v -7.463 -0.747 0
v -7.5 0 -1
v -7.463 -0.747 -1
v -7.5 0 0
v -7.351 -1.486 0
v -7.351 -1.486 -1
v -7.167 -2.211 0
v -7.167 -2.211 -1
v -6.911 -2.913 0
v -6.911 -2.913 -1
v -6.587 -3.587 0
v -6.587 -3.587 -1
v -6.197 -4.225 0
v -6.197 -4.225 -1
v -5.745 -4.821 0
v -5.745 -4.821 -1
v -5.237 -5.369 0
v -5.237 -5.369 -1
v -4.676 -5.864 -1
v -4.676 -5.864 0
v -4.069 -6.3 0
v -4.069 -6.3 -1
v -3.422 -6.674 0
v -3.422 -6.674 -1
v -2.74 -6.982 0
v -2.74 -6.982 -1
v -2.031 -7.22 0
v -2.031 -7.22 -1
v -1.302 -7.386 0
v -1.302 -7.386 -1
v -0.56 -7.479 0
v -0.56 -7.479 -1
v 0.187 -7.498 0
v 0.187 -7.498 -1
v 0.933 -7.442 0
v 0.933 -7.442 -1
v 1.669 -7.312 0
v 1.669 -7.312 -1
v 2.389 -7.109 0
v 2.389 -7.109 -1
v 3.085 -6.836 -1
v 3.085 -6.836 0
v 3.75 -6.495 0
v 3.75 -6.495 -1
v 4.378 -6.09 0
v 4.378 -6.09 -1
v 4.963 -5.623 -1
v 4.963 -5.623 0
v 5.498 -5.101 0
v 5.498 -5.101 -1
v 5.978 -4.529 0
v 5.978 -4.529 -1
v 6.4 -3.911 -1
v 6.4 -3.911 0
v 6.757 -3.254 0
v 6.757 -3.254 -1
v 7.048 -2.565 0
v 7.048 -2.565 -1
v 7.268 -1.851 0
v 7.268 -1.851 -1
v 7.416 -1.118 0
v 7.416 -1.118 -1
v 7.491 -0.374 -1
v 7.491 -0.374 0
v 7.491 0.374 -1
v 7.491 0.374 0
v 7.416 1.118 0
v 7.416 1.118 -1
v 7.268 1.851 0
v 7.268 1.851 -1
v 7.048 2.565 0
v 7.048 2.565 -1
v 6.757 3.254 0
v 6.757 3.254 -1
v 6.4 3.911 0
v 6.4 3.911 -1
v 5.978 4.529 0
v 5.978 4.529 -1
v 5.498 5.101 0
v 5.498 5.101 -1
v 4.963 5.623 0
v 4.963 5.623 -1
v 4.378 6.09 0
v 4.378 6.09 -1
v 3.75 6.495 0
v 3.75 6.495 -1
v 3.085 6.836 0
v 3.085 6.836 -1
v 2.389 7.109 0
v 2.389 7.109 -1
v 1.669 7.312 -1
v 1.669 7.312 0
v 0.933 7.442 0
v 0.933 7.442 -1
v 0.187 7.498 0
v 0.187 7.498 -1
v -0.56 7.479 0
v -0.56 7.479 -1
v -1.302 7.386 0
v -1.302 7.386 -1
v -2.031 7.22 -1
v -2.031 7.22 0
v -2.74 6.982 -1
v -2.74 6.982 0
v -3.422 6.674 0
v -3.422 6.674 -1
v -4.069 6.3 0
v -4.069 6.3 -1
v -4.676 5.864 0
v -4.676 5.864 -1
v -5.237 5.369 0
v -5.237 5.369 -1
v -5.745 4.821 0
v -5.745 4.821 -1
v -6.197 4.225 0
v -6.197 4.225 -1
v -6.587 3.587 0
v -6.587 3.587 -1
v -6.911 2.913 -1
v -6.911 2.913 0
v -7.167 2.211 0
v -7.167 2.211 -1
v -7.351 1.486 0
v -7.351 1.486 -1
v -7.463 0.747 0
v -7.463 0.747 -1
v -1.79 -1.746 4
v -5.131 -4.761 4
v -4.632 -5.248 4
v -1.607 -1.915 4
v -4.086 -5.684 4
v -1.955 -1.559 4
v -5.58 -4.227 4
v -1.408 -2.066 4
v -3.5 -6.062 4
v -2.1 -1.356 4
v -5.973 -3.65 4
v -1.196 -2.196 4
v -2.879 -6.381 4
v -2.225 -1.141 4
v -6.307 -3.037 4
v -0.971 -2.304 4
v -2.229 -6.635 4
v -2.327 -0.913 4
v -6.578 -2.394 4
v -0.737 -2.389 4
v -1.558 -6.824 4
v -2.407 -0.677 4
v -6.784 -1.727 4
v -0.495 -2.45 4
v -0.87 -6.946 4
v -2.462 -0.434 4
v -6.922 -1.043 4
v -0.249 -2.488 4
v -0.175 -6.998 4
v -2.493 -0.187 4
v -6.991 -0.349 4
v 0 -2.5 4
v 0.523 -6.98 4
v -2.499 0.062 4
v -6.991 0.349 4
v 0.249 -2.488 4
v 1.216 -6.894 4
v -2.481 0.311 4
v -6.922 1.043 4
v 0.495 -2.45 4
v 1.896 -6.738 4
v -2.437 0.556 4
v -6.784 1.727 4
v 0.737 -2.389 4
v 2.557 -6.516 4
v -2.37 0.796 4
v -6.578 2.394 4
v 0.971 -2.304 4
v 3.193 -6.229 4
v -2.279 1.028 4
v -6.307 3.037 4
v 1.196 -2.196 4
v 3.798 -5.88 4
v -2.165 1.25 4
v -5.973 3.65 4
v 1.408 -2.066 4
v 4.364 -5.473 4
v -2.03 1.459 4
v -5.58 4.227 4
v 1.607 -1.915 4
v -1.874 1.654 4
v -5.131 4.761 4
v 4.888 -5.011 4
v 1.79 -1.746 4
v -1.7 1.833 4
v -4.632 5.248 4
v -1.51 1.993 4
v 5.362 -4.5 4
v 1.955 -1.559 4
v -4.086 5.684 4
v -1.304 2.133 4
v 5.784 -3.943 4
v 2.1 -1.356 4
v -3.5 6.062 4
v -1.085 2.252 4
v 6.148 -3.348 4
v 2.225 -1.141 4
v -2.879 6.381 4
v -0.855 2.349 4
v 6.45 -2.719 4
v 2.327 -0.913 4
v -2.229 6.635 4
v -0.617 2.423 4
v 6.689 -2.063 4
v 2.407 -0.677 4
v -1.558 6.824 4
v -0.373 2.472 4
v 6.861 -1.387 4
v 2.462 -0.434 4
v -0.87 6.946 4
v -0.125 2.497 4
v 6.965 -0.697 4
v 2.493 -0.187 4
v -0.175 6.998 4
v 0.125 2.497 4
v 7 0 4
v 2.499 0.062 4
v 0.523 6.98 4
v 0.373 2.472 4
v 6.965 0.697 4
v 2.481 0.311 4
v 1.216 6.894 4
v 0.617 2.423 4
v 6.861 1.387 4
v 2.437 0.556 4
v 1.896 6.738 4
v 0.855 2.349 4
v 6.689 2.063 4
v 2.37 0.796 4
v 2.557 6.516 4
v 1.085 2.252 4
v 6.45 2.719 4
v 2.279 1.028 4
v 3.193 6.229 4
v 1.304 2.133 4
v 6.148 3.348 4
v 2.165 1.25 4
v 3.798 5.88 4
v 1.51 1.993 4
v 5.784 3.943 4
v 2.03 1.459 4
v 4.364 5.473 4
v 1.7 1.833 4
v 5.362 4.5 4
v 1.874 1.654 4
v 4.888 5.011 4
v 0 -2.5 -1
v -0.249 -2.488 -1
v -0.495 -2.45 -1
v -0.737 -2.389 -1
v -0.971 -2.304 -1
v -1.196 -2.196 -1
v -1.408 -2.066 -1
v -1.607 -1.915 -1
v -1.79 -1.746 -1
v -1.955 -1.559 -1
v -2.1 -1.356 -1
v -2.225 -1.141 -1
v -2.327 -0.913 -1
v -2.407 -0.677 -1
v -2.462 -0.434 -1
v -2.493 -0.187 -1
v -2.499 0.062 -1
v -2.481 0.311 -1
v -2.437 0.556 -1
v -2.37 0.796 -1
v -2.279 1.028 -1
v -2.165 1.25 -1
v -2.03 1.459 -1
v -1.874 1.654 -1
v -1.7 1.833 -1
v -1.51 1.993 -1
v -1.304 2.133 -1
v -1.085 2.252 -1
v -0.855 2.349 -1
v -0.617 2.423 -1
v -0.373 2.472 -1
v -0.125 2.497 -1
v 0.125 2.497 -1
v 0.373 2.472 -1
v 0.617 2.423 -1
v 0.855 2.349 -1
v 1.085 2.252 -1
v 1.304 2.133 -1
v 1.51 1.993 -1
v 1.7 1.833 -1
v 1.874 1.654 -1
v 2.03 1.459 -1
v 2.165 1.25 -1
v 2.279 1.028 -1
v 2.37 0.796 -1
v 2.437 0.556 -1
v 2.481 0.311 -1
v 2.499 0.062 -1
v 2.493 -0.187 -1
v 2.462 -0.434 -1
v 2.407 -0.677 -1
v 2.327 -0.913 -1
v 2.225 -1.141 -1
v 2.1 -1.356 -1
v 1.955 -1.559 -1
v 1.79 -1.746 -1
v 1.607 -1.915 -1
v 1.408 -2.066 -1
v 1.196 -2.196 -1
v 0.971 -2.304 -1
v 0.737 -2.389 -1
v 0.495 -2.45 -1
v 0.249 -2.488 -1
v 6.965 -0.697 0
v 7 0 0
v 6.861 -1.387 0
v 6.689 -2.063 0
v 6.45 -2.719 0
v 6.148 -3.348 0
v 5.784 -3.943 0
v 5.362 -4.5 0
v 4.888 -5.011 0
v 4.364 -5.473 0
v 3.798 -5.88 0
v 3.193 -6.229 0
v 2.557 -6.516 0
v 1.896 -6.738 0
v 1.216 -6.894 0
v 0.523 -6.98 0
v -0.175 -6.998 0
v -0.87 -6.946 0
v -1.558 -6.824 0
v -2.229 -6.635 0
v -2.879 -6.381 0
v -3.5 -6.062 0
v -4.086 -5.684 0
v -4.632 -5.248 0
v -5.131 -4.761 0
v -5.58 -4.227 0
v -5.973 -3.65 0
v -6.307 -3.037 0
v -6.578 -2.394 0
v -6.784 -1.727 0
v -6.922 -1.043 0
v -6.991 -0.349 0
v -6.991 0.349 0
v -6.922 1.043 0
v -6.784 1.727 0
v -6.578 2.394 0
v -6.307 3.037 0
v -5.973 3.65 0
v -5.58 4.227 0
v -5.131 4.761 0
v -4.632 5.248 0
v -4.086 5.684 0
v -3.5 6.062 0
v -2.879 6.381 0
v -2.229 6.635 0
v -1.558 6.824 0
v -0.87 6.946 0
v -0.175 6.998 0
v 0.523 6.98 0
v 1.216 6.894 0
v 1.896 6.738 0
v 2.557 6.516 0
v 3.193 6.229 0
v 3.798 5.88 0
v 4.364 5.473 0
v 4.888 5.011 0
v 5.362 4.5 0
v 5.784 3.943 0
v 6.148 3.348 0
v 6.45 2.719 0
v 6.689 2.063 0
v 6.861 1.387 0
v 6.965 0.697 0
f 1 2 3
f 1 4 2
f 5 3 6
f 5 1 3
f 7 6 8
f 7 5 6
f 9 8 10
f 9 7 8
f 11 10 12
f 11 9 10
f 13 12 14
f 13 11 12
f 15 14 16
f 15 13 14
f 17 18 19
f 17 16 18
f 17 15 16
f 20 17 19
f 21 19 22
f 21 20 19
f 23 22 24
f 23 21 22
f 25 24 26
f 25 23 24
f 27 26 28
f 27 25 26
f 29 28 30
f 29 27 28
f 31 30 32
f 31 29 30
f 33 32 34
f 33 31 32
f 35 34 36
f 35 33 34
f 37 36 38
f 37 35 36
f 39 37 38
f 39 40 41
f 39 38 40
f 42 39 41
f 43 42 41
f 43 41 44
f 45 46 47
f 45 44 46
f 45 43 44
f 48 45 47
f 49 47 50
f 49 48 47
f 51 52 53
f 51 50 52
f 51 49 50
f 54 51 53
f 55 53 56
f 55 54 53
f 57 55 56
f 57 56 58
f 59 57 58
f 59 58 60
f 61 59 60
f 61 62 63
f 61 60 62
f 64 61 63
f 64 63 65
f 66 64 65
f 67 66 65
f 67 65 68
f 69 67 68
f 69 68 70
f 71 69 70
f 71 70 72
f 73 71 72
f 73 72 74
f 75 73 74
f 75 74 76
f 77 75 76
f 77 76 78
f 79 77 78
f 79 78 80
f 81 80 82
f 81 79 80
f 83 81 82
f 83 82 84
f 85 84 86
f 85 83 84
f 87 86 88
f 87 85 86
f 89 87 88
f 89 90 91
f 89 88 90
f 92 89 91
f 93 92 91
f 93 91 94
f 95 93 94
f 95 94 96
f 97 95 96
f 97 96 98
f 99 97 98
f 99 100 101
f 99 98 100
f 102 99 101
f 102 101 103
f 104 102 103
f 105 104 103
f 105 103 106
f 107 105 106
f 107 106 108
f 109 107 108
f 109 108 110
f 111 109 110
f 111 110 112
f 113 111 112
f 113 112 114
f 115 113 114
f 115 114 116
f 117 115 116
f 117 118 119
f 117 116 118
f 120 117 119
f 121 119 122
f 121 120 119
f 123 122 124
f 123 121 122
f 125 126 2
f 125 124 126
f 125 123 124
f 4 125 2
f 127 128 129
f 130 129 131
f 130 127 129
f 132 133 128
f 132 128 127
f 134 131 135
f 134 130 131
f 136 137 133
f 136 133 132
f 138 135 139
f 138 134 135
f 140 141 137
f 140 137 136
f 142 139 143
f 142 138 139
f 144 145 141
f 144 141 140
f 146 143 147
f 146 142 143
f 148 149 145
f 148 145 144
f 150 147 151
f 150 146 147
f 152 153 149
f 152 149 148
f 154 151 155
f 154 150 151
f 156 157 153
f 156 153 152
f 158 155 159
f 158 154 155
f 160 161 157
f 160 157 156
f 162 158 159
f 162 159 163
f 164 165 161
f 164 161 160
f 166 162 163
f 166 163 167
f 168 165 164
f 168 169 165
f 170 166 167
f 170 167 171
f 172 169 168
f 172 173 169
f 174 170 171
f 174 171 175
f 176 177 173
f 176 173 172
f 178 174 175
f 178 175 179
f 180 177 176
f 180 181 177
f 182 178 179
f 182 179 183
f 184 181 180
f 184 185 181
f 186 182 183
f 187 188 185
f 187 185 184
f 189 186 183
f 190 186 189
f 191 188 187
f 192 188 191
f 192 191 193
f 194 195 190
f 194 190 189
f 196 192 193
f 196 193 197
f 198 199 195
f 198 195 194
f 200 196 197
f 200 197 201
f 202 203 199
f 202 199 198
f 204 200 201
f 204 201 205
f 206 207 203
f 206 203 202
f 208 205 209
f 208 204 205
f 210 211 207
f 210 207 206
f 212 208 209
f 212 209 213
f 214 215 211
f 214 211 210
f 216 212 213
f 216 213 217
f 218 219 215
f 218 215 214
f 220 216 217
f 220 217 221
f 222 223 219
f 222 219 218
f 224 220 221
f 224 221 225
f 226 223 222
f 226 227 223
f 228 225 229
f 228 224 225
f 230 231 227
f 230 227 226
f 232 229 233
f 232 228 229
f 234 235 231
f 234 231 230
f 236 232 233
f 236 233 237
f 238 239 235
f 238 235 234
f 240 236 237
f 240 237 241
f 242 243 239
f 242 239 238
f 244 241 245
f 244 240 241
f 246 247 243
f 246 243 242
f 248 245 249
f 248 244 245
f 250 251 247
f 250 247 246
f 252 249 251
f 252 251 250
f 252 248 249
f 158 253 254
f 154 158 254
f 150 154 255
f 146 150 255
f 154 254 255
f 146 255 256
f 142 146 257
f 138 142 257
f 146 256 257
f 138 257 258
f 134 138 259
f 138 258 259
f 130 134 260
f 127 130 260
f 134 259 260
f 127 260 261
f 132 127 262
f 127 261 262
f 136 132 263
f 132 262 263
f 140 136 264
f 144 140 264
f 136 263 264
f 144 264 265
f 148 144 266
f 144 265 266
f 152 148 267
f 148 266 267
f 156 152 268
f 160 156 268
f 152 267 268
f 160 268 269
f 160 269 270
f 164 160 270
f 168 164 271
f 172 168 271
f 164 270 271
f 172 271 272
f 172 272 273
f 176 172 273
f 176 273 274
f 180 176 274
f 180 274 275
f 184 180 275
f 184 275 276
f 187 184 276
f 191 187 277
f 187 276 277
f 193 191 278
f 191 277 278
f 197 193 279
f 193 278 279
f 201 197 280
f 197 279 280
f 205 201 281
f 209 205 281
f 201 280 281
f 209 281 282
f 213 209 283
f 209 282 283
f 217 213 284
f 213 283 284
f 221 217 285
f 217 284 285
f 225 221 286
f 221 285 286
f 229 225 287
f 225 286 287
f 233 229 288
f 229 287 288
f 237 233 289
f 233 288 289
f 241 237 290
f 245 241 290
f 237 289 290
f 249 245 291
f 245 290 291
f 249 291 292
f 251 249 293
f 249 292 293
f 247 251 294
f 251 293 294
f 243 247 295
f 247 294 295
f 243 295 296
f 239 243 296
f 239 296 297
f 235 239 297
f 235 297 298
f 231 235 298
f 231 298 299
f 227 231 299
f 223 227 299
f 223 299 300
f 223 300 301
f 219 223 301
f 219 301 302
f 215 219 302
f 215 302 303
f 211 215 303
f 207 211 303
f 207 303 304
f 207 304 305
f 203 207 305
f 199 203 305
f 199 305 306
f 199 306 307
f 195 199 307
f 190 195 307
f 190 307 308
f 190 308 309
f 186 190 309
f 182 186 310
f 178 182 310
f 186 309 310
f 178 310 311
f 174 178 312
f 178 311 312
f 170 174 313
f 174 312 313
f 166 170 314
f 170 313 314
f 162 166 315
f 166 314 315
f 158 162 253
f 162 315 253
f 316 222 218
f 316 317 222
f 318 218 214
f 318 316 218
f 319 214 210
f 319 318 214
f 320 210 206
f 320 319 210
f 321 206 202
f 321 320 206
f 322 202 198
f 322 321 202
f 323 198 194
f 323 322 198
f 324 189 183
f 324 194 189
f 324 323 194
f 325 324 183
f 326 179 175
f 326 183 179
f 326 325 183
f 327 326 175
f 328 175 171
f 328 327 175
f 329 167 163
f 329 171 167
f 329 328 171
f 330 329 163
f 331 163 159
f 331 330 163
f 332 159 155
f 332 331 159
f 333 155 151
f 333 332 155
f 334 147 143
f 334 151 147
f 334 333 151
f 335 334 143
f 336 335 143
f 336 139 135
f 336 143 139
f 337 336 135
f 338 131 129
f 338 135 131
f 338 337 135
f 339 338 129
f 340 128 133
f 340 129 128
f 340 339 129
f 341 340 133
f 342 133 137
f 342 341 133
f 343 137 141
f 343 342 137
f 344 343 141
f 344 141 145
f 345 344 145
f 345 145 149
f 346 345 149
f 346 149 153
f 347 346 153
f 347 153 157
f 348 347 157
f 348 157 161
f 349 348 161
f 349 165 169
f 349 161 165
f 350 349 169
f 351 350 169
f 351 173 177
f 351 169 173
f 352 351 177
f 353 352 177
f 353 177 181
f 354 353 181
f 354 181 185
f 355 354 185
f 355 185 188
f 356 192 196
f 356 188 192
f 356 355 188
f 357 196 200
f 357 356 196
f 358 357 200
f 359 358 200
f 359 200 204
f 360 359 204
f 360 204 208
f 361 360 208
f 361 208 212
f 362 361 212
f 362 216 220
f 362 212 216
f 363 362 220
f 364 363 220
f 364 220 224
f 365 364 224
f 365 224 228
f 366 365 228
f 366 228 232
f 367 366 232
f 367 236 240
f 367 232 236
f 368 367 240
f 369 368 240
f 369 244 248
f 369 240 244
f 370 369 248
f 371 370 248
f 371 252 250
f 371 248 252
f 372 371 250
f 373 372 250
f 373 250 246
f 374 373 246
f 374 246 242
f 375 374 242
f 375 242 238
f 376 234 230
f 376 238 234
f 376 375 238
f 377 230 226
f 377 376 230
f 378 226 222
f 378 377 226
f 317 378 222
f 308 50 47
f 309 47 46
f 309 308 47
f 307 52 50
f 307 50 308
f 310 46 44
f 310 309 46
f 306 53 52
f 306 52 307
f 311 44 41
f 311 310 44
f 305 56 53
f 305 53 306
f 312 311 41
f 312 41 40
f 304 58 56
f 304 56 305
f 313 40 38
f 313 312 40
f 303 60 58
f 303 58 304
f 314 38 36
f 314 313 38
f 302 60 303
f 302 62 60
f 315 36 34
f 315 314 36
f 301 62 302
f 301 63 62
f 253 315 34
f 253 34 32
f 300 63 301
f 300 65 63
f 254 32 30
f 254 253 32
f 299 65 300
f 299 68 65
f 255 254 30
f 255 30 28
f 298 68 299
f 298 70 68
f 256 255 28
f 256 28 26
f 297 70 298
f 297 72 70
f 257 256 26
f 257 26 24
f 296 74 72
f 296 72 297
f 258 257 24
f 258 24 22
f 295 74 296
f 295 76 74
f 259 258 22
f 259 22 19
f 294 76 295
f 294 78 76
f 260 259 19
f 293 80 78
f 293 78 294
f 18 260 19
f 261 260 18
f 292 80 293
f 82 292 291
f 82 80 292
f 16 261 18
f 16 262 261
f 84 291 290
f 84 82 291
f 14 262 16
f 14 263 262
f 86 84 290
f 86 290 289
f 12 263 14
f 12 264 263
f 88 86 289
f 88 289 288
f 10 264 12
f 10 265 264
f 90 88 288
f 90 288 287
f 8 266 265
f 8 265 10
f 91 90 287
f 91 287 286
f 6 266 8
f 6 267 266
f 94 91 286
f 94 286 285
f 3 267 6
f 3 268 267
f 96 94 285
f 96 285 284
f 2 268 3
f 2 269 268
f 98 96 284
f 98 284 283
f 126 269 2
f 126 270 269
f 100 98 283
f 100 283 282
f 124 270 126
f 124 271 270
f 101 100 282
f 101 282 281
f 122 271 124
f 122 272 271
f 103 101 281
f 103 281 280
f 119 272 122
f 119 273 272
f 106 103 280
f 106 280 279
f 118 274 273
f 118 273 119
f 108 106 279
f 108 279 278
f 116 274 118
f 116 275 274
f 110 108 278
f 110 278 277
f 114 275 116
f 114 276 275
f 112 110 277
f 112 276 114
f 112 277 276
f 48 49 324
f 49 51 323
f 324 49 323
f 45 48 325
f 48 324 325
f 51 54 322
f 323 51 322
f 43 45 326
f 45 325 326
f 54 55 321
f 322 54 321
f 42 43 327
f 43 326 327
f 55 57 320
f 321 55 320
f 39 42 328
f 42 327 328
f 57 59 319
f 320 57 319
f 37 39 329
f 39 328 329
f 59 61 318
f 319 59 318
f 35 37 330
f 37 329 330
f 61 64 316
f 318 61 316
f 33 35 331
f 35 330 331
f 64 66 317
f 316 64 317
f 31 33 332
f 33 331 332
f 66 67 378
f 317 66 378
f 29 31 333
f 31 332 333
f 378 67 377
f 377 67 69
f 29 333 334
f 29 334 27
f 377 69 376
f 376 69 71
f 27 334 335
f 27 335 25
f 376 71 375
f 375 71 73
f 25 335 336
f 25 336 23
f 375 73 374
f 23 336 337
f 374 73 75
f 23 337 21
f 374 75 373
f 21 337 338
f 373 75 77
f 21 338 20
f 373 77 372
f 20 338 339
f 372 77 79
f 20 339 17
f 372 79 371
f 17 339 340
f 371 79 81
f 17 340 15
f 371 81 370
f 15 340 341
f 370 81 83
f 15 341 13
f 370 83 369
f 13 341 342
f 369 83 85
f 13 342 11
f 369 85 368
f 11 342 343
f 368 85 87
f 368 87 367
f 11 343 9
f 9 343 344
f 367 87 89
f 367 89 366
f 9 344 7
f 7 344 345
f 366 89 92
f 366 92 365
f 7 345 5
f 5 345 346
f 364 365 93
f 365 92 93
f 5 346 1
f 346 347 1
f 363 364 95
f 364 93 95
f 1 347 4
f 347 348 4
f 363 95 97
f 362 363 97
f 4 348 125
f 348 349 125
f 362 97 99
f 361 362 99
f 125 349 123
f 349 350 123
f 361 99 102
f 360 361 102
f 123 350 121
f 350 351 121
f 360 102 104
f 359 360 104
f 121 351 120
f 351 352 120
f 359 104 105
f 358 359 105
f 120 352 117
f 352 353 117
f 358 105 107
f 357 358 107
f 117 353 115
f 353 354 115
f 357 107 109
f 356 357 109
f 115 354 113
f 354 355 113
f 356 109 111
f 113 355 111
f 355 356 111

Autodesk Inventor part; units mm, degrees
ref_plane "YZ Plane" through (0, 0, 0) normal (1, 0, 0) x (0, 1, 0)
ref_plane "XZ Plane" through (0, 0, 0) normal (0, 1, 0) x (-1, 0, 0)
ref_plane "XY Plane" through (0, 0, 0) normal (0, 0, 1) x (1, 0, 0)
sketch "スケッチ1" plane through (0, 0, 0) normal (0, 0, 1) x (1, 0, 0)
  circle A0 centre (0, 0) radius 7
  dimension "d0" = 14
extrude "押し出し1" add sketch "スケッチ1" along normal blind 4
sketch "スケッチ2" plane through (0, 0, 0) normal (0, 0, -1) x (-1, 0, 0)
  circle A0 centre (0, 0) radius 7.5
  dimension "d3" = 15
extrude "押し出し2" add sketch "スケッチ2" along normal blind 1
sketch "スケッチ3" plane through (0, 0, 4) normal (0, 0, 1) x (1, 0, 0)
  point P0 (0, 0)
  point P1 (0, 0)
hole "穴1" at (0, 0, 4) direction (0, 0, -1) diameter 5 depth 5 tip angle 118
properties part number "玉軸受1 F605ZZ"
